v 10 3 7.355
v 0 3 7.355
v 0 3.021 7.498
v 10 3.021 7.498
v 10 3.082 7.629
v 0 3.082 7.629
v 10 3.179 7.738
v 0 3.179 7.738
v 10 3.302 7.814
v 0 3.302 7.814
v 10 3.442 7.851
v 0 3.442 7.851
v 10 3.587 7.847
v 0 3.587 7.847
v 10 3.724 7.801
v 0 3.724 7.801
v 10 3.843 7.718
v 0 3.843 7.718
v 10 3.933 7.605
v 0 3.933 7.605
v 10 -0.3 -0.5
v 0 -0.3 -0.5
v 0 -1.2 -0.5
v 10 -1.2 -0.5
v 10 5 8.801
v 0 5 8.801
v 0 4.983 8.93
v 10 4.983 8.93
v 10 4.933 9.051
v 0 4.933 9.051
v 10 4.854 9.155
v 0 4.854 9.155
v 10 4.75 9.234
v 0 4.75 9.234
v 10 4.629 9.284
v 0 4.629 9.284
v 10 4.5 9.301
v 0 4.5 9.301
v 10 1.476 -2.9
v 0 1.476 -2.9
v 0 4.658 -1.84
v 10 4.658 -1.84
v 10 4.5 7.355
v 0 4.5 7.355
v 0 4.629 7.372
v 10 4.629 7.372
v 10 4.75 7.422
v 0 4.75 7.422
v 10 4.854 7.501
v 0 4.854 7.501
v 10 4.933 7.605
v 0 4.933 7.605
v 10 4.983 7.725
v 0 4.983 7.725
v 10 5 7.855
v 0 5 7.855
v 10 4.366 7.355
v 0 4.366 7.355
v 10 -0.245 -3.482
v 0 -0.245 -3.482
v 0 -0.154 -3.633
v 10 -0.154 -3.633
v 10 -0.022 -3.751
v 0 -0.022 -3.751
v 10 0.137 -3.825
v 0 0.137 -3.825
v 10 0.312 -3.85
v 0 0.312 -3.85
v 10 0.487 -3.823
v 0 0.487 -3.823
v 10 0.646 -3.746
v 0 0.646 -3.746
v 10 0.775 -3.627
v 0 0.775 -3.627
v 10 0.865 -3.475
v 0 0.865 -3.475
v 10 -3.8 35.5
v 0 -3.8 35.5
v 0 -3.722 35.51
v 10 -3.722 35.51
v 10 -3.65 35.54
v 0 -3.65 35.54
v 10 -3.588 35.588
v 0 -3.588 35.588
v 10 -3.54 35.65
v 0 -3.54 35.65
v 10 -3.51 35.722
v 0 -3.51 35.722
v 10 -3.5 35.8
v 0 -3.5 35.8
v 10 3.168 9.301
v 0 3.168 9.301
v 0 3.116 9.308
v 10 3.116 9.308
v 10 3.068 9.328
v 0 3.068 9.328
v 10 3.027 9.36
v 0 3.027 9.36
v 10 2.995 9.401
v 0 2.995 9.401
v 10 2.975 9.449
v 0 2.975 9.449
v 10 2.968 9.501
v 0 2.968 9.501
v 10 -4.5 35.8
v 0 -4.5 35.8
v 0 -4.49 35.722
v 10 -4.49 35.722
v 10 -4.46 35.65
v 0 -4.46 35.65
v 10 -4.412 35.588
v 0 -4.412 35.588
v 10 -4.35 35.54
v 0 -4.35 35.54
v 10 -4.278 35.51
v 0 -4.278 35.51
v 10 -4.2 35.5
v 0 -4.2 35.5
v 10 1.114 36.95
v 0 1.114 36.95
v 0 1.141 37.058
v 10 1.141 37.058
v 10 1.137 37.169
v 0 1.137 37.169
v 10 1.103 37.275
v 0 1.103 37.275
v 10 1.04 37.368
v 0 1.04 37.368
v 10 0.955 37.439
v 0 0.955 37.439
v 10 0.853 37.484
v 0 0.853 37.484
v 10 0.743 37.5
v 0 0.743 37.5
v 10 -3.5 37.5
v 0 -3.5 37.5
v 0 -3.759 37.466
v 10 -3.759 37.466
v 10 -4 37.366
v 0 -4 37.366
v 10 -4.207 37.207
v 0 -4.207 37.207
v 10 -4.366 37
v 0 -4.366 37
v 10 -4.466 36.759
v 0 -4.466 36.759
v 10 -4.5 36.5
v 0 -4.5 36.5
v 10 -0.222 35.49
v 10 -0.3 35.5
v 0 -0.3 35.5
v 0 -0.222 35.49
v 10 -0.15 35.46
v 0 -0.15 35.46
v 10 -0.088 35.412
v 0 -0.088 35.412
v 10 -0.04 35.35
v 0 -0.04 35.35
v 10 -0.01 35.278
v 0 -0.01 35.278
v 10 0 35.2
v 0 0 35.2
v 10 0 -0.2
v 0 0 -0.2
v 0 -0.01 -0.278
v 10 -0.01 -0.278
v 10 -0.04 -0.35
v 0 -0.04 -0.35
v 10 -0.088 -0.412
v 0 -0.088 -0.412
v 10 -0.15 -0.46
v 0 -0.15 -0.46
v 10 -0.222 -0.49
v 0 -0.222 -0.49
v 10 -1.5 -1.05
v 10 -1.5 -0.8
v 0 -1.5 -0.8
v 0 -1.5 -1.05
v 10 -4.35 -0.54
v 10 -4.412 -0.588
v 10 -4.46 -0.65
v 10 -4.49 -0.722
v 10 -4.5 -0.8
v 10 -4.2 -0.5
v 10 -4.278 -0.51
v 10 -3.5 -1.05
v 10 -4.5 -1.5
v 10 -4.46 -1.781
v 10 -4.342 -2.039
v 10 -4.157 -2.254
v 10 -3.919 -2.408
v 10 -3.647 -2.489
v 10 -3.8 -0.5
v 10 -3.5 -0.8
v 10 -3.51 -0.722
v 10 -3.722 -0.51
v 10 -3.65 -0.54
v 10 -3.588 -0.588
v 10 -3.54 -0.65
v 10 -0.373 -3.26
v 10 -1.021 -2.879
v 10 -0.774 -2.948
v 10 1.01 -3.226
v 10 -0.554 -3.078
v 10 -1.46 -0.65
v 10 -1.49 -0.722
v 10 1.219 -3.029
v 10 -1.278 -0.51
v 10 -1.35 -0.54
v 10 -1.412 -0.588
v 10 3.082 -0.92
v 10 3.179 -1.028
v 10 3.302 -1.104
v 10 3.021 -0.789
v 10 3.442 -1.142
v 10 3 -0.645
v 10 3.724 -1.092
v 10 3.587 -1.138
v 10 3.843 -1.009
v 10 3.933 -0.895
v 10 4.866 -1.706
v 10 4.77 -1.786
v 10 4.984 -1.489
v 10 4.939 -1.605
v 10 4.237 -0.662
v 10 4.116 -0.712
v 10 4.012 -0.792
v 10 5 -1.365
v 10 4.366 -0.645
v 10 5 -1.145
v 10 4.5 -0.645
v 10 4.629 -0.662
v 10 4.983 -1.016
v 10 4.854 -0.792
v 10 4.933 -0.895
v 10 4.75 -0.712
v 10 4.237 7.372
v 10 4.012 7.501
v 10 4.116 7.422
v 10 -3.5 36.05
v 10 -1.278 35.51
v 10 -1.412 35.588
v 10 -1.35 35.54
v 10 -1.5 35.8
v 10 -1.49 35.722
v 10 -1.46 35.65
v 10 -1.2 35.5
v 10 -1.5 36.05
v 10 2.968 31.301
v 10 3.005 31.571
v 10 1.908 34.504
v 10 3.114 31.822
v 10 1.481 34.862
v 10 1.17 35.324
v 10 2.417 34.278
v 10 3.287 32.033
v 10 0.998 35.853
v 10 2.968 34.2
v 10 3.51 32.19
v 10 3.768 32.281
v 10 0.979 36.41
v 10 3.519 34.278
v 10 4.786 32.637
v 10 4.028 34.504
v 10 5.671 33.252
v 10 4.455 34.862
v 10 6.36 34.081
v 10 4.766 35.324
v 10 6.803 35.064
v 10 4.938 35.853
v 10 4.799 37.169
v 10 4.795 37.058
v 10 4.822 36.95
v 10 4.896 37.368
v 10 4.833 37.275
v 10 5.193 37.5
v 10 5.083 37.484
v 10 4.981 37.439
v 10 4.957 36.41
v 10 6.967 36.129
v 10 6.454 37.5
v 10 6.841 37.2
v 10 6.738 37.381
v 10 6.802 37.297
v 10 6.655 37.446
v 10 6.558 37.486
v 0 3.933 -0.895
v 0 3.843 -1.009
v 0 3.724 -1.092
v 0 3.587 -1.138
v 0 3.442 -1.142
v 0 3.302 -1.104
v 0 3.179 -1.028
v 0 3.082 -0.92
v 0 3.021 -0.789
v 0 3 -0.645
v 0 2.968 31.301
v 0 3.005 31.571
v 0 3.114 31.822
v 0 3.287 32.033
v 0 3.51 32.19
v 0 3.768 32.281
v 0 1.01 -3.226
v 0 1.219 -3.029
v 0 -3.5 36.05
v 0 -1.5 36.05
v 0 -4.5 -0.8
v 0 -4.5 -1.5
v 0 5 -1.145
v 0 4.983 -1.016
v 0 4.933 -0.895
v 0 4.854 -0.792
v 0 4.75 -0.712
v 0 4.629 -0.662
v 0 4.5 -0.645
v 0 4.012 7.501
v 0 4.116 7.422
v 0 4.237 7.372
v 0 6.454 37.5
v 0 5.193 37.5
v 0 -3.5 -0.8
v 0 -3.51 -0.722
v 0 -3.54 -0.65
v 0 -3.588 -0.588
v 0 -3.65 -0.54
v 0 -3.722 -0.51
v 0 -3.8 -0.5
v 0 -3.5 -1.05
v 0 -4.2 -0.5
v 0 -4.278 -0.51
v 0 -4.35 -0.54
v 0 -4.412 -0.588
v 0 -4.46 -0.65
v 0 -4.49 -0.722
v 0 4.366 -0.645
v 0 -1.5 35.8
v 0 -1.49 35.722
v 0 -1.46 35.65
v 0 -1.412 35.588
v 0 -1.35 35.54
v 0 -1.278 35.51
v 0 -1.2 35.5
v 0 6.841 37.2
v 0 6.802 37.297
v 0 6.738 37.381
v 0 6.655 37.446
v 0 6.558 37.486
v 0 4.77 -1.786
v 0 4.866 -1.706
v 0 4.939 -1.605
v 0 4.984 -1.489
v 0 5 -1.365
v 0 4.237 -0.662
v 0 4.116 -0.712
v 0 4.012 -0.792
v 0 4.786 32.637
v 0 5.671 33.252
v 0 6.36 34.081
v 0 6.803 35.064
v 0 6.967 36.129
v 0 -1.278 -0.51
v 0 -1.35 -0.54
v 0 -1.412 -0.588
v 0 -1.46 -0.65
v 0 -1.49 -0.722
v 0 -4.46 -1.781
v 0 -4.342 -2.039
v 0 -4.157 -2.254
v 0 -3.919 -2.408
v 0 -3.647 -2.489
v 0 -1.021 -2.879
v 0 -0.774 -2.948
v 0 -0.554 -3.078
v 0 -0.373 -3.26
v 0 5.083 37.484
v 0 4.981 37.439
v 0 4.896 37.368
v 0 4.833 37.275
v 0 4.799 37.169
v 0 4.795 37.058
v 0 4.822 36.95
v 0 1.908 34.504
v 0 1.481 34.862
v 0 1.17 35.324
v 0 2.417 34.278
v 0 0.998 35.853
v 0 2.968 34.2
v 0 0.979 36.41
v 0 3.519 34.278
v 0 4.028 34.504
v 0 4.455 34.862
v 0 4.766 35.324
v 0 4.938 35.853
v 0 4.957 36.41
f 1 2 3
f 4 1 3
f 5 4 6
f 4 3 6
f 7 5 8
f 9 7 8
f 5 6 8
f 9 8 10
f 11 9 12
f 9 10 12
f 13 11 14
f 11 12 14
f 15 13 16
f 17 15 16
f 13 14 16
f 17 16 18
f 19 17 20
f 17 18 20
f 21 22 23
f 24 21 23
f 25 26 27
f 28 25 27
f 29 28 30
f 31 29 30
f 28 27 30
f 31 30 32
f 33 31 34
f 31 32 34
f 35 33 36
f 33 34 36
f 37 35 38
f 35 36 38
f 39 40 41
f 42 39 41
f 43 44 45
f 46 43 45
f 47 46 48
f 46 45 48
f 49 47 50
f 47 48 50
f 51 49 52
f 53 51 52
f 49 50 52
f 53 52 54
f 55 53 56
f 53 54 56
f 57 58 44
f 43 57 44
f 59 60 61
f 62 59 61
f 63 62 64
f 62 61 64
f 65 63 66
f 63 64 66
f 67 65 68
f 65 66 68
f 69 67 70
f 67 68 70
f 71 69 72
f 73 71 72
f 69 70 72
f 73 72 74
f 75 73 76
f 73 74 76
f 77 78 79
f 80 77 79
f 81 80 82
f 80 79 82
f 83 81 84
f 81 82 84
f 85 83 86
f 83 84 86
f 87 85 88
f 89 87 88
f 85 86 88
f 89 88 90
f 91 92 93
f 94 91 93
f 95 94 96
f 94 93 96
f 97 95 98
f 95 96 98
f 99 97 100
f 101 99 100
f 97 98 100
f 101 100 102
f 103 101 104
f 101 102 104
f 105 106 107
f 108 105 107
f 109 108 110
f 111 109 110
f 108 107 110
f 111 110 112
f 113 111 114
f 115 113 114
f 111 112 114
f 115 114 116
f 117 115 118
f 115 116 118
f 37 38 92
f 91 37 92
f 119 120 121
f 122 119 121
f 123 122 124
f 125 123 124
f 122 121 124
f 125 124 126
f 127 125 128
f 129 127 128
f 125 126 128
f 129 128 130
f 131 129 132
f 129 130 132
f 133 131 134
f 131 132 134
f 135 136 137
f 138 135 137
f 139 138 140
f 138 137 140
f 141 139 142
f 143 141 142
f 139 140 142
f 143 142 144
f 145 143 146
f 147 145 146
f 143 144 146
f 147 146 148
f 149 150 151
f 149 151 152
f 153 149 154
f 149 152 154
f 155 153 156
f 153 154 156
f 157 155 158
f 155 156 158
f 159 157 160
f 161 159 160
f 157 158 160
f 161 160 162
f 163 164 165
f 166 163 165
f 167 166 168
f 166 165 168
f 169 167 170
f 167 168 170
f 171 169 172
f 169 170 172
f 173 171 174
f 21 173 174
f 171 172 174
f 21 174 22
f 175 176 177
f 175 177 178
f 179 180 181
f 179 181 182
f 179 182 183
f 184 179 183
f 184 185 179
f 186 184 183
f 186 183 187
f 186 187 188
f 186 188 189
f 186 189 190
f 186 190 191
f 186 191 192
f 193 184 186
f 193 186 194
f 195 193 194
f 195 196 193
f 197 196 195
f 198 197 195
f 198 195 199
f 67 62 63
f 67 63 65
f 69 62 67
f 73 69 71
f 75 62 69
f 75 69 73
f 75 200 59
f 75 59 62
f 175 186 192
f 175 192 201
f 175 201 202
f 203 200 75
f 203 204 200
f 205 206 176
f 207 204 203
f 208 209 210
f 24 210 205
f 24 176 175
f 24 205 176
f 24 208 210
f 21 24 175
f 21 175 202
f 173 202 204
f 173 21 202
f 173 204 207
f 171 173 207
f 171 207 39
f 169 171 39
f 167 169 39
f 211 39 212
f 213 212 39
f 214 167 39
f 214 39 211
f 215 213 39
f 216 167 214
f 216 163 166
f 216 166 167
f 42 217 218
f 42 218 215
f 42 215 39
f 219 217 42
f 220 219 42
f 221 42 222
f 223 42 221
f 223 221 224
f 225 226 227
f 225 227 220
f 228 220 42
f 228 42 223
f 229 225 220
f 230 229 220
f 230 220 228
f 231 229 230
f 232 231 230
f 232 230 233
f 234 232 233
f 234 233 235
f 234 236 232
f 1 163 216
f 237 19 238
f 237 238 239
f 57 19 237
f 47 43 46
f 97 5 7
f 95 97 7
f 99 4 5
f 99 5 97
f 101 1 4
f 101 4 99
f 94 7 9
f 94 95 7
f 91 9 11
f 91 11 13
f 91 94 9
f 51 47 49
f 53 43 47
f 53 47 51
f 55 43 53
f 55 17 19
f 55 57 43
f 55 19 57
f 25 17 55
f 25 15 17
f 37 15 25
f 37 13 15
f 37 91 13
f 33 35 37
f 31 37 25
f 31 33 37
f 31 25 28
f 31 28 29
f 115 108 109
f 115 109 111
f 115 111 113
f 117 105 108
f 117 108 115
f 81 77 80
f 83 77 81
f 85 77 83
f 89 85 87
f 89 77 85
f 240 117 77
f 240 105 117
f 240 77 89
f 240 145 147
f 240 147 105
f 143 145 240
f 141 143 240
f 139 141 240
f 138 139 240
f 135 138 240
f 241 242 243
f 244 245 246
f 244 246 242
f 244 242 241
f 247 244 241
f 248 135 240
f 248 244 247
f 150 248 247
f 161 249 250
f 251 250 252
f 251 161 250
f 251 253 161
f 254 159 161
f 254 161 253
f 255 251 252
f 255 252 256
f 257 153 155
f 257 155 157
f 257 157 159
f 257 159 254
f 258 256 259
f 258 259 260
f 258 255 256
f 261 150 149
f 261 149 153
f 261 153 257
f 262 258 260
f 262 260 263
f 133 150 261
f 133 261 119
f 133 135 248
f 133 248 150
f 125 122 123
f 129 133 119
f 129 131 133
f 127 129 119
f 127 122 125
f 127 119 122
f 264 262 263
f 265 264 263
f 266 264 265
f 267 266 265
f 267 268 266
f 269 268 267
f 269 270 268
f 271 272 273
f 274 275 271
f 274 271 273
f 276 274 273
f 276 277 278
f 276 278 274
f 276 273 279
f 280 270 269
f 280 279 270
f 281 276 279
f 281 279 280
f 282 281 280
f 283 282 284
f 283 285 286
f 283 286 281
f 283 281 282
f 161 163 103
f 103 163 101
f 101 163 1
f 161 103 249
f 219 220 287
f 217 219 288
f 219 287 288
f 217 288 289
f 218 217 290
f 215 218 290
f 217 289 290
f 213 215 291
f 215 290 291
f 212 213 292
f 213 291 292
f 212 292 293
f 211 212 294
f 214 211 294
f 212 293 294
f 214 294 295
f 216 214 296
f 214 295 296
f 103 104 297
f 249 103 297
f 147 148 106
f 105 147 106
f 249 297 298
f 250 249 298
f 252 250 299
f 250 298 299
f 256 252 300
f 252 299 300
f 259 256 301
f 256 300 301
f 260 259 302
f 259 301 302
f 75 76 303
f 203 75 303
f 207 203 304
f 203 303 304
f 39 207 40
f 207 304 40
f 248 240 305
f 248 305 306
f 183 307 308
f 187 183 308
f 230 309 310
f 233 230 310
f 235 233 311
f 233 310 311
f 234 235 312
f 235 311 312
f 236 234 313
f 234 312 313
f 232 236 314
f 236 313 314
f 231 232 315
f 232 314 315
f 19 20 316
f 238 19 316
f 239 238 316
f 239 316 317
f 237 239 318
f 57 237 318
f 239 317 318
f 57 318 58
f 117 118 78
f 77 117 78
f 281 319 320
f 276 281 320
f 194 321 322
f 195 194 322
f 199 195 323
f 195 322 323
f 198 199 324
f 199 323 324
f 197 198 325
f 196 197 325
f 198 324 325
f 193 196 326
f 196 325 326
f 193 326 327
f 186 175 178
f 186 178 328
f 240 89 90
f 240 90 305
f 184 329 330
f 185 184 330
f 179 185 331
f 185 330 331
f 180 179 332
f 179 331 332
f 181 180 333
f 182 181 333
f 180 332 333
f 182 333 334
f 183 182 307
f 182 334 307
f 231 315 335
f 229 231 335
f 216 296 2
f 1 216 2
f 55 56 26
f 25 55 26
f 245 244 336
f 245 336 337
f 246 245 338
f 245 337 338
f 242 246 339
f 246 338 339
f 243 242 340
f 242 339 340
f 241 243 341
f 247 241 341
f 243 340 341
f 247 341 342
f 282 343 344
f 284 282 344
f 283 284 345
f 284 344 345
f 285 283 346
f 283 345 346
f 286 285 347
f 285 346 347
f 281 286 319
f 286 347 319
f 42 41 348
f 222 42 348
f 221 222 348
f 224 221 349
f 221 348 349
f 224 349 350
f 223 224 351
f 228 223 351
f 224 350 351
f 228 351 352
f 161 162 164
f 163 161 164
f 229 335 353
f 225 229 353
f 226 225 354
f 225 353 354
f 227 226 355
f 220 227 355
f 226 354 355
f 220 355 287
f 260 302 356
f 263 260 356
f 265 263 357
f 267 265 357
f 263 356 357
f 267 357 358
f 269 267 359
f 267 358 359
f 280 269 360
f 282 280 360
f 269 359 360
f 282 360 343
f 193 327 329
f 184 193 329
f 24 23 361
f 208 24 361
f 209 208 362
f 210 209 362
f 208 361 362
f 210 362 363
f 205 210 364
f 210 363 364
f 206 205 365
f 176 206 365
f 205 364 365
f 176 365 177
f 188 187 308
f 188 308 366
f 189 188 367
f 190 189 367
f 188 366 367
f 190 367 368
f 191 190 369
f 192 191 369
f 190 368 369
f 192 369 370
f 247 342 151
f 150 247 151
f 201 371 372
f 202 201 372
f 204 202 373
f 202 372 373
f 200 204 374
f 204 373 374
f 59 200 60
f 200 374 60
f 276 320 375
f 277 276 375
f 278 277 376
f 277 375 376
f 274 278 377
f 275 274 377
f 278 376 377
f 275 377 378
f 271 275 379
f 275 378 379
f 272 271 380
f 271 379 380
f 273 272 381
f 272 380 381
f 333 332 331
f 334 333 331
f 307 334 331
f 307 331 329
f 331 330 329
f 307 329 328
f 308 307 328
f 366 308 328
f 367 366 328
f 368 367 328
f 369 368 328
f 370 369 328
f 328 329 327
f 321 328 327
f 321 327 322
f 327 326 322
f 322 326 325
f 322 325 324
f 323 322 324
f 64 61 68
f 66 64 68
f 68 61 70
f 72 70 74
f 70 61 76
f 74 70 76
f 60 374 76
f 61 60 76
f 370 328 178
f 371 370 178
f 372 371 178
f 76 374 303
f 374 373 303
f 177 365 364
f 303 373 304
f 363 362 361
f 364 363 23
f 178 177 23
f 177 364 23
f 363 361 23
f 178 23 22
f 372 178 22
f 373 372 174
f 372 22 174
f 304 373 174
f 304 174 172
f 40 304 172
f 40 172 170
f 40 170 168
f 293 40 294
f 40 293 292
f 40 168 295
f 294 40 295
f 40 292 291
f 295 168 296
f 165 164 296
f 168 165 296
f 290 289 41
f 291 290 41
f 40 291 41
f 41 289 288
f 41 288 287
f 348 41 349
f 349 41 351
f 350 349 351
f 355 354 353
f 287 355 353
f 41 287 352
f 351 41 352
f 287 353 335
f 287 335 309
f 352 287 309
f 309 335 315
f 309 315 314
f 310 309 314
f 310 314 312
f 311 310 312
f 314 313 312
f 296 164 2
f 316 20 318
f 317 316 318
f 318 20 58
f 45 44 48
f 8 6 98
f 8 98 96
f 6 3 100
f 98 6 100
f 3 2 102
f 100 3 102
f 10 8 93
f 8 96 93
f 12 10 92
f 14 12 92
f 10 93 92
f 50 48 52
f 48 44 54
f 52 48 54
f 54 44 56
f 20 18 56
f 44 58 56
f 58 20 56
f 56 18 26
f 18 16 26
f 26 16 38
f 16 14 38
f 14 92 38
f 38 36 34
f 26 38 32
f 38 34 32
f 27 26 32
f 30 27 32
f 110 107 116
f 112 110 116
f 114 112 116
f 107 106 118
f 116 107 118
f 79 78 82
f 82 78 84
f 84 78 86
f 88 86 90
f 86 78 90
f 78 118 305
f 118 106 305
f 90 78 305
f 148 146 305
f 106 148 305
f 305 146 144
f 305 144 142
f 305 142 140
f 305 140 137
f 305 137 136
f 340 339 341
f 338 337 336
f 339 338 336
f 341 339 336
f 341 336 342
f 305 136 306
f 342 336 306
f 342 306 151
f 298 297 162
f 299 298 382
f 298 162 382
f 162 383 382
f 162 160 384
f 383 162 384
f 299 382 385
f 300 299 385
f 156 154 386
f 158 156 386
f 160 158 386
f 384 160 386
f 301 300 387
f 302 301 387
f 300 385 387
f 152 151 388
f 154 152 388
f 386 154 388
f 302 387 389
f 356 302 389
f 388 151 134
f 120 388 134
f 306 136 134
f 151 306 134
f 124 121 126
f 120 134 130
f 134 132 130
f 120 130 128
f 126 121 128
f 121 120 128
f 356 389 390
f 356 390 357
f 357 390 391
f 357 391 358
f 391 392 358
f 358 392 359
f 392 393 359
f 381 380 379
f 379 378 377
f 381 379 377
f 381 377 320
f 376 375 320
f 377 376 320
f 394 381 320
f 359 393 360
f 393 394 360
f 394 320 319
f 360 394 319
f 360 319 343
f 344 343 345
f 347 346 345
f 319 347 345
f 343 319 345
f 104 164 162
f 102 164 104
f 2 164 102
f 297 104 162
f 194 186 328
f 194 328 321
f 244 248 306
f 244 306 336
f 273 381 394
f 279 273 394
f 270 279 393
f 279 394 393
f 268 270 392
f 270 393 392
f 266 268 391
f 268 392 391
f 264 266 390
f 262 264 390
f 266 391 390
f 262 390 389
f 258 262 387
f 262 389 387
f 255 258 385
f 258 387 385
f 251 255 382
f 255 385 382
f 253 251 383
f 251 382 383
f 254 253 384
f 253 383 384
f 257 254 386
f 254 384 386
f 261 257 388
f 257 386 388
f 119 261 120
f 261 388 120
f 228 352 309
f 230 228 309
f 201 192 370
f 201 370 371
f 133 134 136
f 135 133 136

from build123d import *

# Parameters (mm, degrees)
F3_DEPTH = 10


with BuildPart() as f3:
    # F2 (on Right) → F3 (new body)
    with BuildSketch(Plane.YZ):
        with BuildLine():
            ThreePointArc((-4.5, 35.8), (-4.412132, 35.587868), (-4.2, 35.5))
            Line((-4.2, 35.5), (-3.8, 35.5))
            ThreePointArc((-3.8, 35.5), (-3.587868, 35.587868), (-3.5, 35.8))
            Line((-3.5, 35.8), (-3.5, 36.05))
            Line((-3.5, 36.05), (-1.5, 36.05))
            Line((-1.5, 36.05), (-1.5, 35.8))
            ThreePointArc((-1.5, 35.8), (-1.412132, 35.587868), (-1.2, 35.5))
            Line((-1.2, 35.5), (-0.3, 35.5))
            ThreePointArc((-0.3, 35.5), (-0.087868, 35.412132), (0, 35.2))
            Line((0, 35.2), (0, -0.2))
            ThreePointArc((0, -0.2), (-0.087868, -0.412132), (-0.3, -0.5))
            Line((-0.3, -0.5), (-1.2, -0.5))
            ThreePointArc((-1.2, -0.5), (-1.412132, -0.587868), (-1.5, -0.8))
            Line((-1.5, -0.8), (-1.5, -1.05))
            Line((-1.5, -1.05), (-3.5, -1.05))
            Line((-3.5, -1.05), (-3.5, -0.8))
            ThreePointArc((-3.5, -0.8), (-3.587868, -0.587868), (-3.8, -0.5))
            Line((-3.8, -0.5), (-4.2, -0.5))
            ThreePointArc((-4.2, -0.5), (-4.412132, -0.587868), (-4.5, -0.8))
            Line((-4.5, -0.8), (-4.5, -1.5))
            ThreePointArc((-4.5, -1.5), (-4.257206, -2.153176), (-3.646721, -2.489178))
            Line((-3.646721, -2.489178), (-1.020876, -2.87866))
            ThreePointArc((-1.020876, -2.87866), (-0.55385, -3.078335), (-0.245161, -3.481689))
            ThreePointArc((-0.245161, -3.481689), (0.31218, -3.849987), (0.864712, -3.474515))
            ThreePointArc((0.864712, -3.474515), (1.107187, -3.120048), (1.47598, -2.899975))
            Line((1.47598, -2.899975), (4.658042, -1.839826))
            ThreePointArc((4.658042, -1.839826), (4.905599, -1.657846), (5, -1.36546))
            Line((5, -1.36546), (5, -1.145353))
            ThreePointArc((5, -1.145353), (4.853553, -0.7918), (4.5, -0.645353))
            Line((4.5, -0.645353), (4.366025, -0.645353))
            ThreePointArc((4.366025, -0.645353), (4.116025, -0.71234), (3.933013, -0.895353))
            ThreePointArc((3.933013, -0.895353), (3.37059, -1.128316), (3, -0.645353))
            Line((3, -0.645353), (3, 7.354647))
            ThreePointArc((3, 7.354647), (3.37059, 7.83761), (3.933013, 7.604647))
            ThreePointArc((3.933013, 7.604647), (4.116025, 7.421634), (4.366025, 7.354647))
            Line((4.366025, 7.354647), (4.5, 7.354647))
            ThreePointArc((4.5, 7.354647), (4.853553, 7.501094), (5, 7.854647))
            Line((5, 7.854647), (5, 8.801021))
            ThreePointArc((5, 8.801021), (4.853553, 9.154574), (4.5, 9.301021))
            Line((4.5, 9.301021), (3.168028, 9.301021))
            ThreePointArc((3.168028, 9.301021), (3.026607, 9.359599), (2.968028, 9.501021))
            Line((2.968028, 9.501021), (2.968028, 31.301021))
            ThreePointArc((2.968028, 31.301021), (3.193432, 31.933476), (3.768028, 32.280816))
            ThreePointArc((3.768028, 32.280816), (6.360488, 34.080751), (6.841012, 37.2))
            ThreePointArc((6.841012, 37.2), (6.698662, 37.416228), (6.453713, 37.5))
            Line((6.453713, 37.5), (5.192888, 37.5))
            ThreePointArc((5.192888, 37.5), (4.861225, 37.323607), (4.822078, 36.95))
            ThreePointArc((4.822078, 36.95), (2.968028, 34.2), (1.113979, 36.95))
            ThreePointArc((1.113979, 36.95), (1.074831, 37.323607), (0.743169, 37.5))
            Line((0.743169, 37.5), (-3.5, 37.5))
            ThreePointArc((-3.5, 37.5), (-4.207107, 37.207107), (-4.5, 36.5))
            Line((-4.5, 36.5), (-4.5, 35.8))
        make_face()
    extrude(amount=F3_DEPTH)


solid = f3.part
